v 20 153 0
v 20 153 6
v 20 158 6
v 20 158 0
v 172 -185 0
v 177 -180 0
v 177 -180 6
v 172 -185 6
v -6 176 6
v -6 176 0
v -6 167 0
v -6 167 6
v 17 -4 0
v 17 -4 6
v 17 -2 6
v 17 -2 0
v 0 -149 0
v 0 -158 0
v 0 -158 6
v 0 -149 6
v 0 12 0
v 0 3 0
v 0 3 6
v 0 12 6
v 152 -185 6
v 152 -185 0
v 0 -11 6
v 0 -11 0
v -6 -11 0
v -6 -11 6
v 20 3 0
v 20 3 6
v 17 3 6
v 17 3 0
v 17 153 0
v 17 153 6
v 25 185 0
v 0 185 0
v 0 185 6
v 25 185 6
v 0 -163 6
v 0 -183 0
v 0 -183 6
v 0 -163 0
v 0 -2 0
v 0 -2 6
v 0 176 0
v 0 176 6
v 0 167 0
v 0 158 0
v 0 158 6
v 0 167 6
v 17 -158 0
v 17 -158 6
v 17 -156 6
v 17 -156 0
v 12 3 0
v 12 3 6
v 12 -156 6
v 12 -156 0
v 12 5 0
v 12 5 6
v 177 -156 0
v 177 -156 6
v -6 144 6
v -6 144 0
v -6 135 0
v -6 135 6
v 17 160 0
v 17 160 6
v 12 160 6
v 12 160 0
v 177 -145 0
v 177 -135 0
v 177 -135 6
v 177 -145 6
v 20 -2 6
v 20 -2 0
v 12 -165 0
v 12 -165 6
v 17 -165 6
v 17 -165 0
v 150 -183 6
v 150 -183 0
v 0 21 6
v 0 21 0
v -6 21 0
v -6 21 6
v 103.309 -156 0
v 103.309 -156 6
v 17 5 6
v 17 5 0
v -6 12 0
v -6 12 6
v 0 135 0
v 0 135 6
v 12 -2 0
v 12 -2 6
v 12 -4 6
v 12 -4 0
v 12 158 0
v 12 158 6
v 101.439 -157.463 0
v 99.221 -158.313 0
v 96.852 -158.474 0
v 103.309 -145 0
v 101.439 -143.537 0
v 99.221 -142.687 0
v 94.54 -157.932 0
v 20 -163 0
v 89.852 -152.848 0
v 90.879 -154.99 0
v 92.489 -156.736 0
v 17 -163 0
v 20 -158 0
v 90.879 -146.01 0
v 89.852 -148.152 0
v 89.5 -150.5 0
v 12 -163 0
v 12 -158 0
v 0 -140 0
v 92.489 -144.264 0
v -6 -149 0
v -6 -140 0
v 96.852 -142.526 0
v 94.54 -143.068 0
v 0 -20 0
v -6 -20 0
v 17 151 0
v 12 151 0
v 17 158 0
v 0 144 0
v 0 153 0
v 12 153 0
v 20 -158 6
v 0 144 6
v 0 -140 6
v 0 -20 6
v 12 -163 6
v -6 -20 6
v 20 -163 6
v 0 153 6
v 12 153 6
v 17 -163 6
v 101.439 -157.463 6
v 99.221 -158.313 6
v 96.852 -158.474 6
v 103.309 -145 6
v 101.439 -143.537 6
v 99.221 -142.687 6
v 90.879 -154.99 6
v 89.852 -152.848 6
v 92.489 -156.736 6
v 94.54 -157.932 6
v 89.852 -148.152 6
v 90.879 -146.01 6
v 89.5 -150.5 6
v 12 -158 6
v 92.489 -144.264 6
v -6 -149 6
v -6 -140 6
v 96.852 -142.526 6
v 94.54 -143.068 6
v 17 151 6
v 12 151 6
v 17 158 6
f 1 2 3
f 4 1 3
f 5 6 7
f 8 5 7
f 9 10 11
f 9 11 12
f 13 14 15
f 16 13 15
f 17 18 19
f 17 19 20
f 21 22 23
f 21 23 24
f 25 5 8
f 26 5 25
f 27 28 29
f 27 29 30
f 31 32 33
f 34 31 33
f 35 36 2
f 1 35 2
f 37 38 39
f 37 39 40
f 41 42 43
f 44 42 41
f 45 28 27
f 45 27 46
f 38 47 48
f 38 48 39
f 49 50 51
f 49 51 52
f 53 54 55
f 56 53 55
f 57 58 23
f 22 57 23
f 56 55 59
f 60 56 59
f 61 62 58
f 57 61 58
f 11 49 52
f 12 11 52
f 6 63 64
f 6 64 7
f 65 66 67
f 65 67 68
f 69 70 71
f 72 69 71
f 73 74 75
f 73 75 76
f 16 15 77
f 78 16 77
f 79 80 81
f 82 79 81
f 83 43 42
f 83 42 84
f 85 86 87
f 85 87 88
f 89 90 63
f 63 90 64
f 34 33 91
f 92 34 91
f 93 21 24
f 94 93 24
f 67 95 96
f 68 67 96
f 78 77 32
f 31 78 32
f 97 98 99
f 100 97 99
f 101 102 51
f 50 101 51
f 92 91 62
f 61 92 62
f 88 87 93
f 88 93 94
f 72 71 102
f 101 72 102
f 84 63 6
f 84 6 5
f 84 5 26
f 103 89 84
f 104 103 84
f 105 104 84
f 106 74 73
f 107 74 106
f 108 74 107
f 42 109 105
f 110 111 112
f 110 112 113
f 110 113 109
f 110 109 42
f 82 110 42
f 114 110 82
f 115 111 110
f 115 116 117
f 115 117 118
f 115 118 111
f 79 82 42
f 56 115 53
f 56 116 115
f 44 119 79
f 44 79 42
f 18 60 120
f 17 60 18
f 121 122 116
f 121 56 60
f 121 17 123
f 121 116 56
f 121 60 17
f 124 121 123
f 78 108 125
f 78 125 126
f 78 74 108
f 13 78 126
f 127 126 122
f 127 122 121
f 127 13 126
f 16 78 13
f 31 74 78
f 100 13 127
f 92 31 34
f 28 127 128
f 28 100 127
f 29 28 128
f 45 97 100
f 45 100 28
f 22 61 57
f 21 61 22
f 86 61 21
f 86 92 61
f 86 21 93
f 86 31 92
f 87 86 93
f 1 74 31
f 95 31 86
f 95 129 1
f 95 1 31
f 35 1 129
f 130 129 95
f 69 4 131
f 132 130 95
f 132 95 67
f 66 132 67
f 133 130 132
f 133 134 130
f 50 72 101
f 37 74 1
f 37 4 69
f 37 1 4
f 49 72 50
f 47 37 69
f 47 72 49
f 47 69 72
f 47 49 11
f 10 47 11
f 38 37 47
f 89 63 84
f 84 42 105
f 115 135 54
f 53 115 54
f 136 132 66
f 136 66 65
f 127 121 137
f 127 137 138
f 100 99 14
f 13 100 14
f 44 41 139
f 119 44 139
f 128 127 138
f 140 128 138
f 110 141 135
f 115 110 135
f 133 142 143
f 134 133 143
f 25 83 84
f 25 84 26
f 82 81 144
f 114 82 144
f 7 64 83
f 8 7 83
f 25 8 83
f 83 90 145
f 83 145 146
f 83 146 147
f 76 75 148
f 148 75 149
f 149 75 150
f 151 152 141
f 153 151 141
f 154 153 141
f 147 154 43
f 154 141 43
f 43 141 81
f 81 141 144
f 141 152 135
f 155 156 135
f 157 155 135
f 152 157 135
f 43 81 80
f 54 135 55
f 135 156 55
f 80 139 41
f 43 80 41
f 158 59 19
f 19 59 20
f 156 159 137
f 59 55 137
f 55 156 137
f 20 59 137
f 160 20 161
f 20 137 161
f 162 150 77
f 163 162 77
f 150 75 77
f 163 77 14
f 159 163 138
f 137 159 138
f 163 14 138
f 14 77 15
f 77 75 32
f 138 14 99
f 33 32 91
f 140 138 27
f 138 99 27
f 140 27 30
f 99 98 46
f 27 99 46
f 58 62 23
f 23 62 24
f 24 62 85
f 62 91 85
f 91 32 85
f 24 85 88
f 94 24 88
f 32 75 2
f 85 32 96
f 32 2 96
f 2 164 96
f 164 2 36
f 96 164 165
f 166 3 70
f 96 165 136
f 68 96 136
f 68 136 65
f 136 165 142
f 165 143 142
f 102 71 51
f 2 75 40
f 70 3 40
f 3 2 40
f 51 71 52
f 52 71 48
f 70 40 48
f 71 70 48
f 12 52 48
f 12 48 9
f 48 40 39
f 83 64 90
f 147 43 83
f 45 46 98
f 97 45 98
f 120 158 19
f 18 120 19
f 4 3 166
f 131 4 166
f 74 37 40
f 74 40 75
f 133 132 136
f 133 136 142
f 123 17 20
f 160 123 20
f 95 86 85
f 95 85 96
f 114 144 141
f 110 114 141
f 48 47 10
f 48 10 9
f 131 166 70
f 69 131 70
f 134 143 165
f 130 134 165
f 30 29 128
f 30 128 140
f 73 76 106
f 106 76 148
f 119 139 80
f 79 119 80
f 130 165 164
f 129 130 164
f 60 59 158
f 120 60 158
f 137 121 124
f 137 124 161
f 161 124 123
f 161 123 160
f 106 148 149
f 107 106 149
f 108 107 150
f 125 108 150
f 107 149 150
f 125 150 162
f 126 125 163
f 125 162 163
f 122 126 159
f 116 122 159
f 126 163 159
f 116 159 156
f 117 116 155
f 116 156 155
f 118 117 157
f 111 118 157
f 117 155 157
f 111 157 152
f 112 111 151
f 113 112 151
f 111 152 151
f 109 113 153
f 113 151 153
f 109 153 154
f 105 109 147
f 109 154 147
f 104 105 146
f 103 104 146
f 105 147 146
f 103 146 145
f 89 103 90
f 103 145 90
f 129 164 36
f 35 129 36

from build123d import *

# Parameters (mm, degrees)
DODANIE_WYCI_GNI_CIE1_DEPTH = 6
SFAZOWANIE1_SIZE            = 5
WYTNIJ_WYCI_GNI_CIE1_REACH  = 258.105
WYTNIJ_WYCI_GNI_CIE2_REACH  = 258.105
SZKIC5_W                    = 6
SZKIC5_H                    = 9
DODANIE_WYCI_GNI_CIE3_DEPTH = 6
WYTNIJ_WYCI_GNI_CIE3_REACH  = 258.105


with BuildPart() as part:
    # Szkic1 → Dodanie-wyciągnięcie1 (new body)
    with BuildSketch(Plane.XY):
        Polygon((0, -185), (0, 185), (25, 185), (177, -135), (177, -185), align=None)
    extrude(amount=DODANIE_WYCI_GNI_CIE1_DEPTH)

    # Sfazowanie1
    sfazowanie1_edges = [part.edges().sort_by_distance(p)[0] for p in [
        (177, -185, 3),
    ]]
    chamfer(sfazowanie1_edges, length=SFAZOWANIE1_SIZE)

    # Szkic2 → Wytnij-wyciągnięcie1 (cut, up to next)
    with BuildSketch(Plane.XY.offset(6), mode=Mode.PRIVATE) as wytnij_wyci_gni_cie1_sk1:
        Polygon((0, -183), (150, -183), (152, -185), (0, -185), align=None)
    wytnij_wyci_gni_cie1_tool1 = extrude(wytnij_wyci_gni_cie1_sk1.sketch, amount=-WYTNIJ_WYCI_GNI_CIE1_REACH, mode=Mode.PRIVATE) & part.part
    add(wytnij_wyci_gni_cie1_tool1.solids().sort_by_distance((75.501104, -184.002208, 6))[0], mode=Mode.SUBTRACT)

    # Szkic3 → Wytnij-wyciągnięcie2 (cut, up to next)
    with BuildSketch(Plane.XY.offset(6), mode=Mode.PRIVATE) as wytnij_wyci_gni_cie2_sk1:
        with BuildLine():
            Line((177, -145), (103.309475019, -145))
            ThreePointArc((103.309475019, -145), (89.5, -150.5), (103.309475019, -156))
            Line((103.309475019, -156), (177, -156))
            Line((177, -156), (177, -145))
        make_face()
    wytnij_wyci_gni_cie2_tool1 = extrude(wytnij_wyci_gni_cie2_sk1.sketch, amount=-WYTNIJ_WYCI_GNI_CIE2_REACH, mode=Mode.PRIVATE) & part.part
    add(wytnij_wyci_gni_cie2_tool1.solids().sort_by_distance((132.134709, -150.5, 6))[0], mode=Mode.SUBTRACT)

    # Szkic5 → Dodanie-wyciągnięcie3 (add)
    with BuildSketch(Plane.ZY):
        with Locations((3, 171.5)):
            Rectangle(SZKIC5_W, SZKIC5_H)
        with Locations((3, 139.5)):
            Rectangle(SZKIC5_W, SZKIC5_H)
        with Locations((3, -144.5)):
            Rectangle(SZKIC5_W, SZKIC5_H)
        with Locations((3, -15.5)):
            Rectangle(SZKIC5_W, SZKIC5_H)
        with Locations((3, 16.5)):
            Rectangle(SZKIC5_W, SZKIC5_H)
    extrude(amount=DODANIE_WYCI_GNI_CIE3_DEPTH)

    # Szkic6 → Wytnij-wyciągnięcie3 (cut, up to next)
    with BuildSketch(Plane.XY.offset(6), mode=Mode.PRIVATE) as wytnij_wyci_gni_cie3_sk1:
        Polygon((12, -156), (12, -158), (0, -158), (0, -160.5), (0, -163), (12, -163), (12, -165), (17, -165), (17, -163), (20, -163), (20, -158), (17, -158), (17, -156), align=None)
    wytnij_wyci_gni_cie3_tool1 = extrude(wytnij_wyci_gni_cie3_sk1.sketch, amount=-WYTNIJ_WYCI_GNI_CIE3_REACH, mode=Mode.PRIVATE) & part.part
    # Szkic6 → Wytnij-wyciągnięcie3 (cut, up to next)
    with BuildSketch(Plane.XY.offset(6), mode=Mode.PRIVATE) as wytnij_wyci_gni_cie3_sk2:
        Polygon((12, 3), (0, 3), (0, -2), (12, -2), (12, -4), (17, -4), (17, -2), (20, -2), (20, 3), (17, 3), (17, 5), (12, 5), align=None)
    wytnij_wyci_gni_cie3_tool2 = extrude(wytnij_wyci_gni_cie3_sk2.sketch, amount=-WYTNIJ_WYCI_GNI_CIE3_REACH, mode=Mode.PRIVATE) & part.part
    # Szkic6 → Wytnij-wyciągnięcie3 (cut, up to next)
    with BuildSketch(Plane.XY.offset(6), mode=Mode.PRIVATE) as wytnij_wyci_gni_cie3_sk3:
        Polygon((12, 158), (0, 158), (0, 153), (12, 153), (12, 151), (17, 151), (17, 153), (20, 153), (20, 158), (17, 158), (17, 160), (12, 160), align=None)
    wytnij_wyci_gni_cie3_tool3 = extrude(wytnij_wyci_gni_cie3_sk3.sketch, amount=-WYTNIJ_WYCI_GNI_CIE3_REACH, mode=Mode.PRIVATE) & part.part
    add(wytnij_wyci_gni_cie3_tool1.solids().sort_by_distance((10.75, -160.5, 6))[0], mode=Mode.SUBTRACT)
    add(wytnij_wyci_gni_cie3_tool2.solids().sort_by_distance((10.75, 0.5, 6))[0], mode=Mode.SUBTRACT)
    add(wytnij_wyci_gni_cie3_tool3.solids().sort_by_distance((10.75, 155.5, 6))[0], mode=Mode.SUBTRACT)


solid = part.part
